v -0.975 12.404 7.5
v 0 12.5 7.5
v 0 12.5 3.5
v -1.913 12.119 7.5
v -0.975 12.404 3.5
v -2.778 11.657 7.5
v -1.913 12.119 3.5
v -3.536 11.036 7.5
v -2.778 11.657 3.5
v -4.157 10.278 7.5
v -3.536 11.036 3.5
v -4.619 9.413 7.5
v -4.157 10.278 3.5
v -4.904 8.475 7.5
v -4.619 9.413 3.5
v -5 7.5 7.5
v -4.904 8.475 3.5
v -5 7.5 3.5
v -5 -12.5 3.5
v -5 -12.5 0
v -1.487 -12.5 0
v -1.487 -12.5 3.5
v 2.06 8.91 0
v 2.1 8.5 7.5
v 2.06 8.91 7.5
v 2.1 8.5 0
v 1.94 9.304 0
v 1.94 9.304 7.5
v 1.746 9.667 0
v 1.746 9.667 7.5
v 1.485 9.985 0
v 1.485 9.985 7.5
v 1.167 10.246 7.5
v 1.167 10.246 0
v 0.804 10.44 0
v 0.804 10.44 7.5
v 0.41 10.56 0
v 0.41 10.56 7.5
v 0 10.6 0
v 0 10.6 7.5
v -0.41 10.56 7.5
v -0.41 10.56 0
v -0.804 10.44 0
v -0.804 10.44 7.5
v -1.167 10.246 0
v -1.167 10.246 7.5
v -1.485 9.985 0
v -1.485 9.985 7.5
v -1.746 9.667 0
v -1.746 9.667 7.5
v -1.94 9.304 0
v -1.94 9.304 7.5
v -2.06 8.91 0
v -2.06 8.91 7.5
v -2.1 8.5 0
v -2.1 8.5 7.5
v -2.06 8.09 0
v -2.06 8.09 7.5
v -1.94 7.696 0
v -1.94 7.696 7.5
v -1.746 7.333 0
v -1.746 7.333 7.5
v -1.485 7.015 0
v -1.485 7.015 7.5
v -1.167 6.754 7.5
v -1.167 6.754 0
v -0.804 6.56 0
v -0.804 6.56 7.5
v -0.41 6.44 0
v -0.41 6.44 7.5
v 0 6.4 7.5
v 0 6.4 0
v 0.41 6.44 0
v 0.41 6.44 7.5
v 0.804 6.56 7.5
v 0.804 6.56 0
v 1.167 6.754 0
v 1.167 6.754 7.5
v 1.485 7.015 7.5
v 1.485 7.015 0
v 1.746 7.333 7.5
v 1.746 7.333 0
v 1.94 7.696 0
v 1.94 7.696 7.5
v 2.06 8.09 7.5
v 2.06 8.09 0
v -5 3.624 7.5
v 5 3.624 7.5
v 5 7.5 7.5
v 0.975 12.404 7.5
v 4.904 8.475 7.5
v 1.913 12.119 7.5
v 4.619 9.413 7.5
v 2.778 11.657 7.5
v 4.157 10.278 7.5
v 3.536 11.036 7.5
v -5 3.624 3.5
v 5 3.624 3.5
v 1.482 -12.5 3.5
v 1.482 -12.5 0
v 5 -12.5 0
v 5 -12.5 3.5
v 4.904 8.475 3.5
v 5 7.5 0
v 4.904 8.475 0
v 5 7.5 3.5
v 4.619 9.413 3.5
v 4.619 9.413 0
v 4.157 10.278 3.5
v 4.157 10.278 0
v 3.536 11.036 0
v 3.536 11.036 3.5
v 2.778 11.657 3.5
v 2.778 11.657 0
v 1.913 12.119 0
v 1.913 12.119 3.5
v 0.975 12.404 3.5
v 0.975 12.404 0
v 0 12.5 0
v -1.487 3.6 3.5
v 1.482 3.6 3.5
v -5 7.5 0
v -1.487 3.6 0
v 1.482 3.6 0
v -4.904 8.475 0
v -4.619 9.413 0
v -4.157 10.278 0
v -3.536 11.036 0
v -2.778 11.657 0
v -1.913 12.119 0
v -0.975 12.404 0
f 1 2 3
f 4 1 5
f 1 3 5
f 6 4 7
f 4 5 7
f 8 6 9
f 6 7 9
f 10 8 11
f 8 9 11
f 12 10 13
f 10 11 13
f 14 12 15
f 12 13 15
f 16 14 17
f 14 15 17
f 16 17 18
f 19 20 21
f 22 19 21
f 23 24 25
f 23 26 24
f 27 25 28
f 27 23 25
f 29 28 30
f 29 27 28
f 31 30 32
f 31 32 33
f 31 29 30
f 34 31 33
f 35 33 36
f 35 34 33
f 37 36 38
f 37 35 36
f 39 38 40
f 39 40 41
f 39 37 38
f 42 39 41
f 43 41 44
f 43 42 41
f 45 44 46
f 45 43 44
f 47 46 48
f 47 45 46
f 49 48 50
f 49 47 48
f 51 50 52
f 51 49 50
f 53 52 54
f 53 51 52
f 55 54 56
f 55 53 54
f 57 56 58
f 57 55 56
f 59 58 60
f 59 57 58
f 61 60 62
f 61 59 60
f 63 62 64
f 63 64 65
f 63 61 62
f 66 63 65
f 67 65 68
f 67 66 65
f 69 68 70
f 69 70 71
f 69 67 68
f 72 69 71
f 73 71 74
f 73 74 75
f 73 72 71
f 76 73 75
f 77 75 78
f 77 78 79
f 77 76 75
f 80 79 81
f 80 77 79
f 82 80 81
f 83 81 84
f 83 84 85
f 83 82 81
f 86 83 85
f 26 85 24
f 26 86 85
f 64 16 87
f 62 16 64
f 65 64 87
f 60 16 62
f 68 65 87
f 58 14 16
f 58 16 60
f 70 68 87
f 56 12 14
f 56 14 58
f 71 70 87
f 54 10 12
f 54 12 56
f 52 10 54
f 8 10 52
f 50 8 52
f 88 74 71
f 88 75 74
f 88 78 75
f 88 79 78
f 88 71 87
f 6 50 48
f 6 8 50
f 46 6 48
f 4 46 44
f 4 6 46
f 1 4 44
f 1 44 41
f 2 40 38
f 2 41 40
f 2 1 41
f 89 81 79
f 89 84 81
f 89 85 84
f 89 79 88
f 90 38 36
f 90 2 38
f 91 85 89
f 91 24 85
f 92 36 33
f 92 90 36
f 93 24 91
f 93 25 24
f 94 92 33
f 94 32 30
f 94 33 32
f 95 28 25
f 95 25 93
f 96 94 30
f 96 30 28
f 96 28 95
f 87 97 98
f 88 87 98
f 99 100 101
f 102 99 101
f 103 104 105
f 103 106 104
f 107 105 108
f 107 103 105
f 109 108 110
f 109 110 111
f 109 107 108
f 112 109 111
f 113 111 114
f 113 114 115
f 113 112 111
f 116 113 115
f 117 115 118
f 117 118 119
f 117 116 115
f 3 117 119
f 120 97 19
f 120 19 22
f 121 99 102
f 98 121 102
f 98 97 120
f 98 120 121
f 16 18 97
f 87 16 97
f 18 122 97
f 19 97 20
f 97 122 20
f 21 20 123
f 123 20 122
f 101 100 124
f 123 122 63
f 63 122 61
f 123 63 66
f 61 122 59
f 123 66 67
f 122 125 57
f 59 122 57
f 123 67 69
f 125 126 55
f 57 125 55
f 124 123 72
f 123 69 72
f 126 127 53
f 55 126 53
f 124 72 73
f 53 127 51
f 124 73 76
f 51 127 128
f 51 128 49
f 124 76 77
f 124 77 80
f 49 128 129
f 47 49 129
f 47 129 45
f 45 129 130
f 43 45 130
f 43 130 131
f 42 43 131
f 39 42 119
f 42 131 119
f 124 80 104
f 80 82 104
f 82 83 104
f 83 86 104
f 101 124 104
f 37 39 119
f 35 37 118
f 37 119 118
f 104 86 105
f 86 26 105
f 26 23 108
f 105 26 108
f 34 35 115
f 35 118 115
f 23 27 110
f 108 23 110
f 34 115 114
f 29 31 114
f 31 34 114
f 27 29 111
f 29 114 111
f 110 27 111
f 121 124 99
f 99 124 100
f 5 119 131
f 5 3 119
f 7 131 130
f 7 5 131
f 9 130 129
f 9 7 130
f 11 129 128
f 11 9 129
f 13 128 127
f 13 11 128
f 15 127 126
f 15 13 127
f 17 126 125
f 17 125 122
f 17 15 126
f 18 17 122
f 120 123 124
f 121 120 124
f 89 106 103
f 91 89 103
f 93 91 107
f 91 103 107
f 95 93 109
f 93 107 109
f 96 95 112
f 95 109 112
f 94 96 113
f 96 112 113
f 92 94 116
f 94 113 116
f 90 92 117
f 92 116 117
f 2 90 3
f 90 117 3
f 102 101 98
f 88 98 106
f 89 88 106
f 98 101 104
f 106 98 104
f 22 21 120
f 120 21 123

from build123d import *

# Parameters (mm, degrees)
F0_R     = 2.1
F1_DEPTH = 3.5
F2_R     = 4.99999
F3_R     = 2.1
F4_DEPTH = 4


# Not quite as in the source:
# - a fillet or chamfer is up to 0.001 mm smaller than in the source, because OpenCascade refuses the exact size
# - ends of sketch curves that miss each other by under 0.0002 mm in the source are joined


with BuildPart() as f1:
    # F0 (on Top) → F1 (new body)
    with BuildSketch(Plane.XY):
        Polygon((1.4820488868, -12.5), (5, -12.5), (5, 12.5), (-5, 12.5), (-5, -12.5), (-1.4866787242, -12.5), (-1.4866787242, 3.6), (1.4820488868, 3.6), align=None)
        with Locations((0, 8.5)):
            Circle(F0_R, mode=Mode.SUBTRACT)
    extrude(amount=F1_DEPTH)

    # F2 (radius 5 in the source; OpenCascade refuses exactly that, so slightly less here)
    f2_edges = [f1.edges().sort_by_distance(p)[0] for p in [
        (-5, 12.5, 1.75),
        (5, 12.5, 1.75),
    ]]
    fillet(f2_edges, radius=F2_R)

    # F3 (on face) → F4 (join)
    with BuildSketch(Plane.XY.offset(3.5)):
        with BuildLine():
            Line((-5, 3.6241896451), (0, 3.6241896451))
            Line((0, 3.6241896451), (5, 3.6241896451))
            Line((5, 3.6241896451), (5, 7.50001))
            ThreePointArc((5, 7.50001), (3.5355368349, 11.0355368349), (1e-05, 12.5))
            ThreePointArc((1e-05, 12.5), (-3.5355368349, 11.0355368349), (-5, 7.50001))
            Line((-5, 7.50001), (-5, 3.6241896451))
        make_face()
        with Locations((0, 8.5)):
            Circle(F3_R, mode=Mode.SUBTRACT)
    extrude(amount=F4_DEPTH)


solid = f1.part
